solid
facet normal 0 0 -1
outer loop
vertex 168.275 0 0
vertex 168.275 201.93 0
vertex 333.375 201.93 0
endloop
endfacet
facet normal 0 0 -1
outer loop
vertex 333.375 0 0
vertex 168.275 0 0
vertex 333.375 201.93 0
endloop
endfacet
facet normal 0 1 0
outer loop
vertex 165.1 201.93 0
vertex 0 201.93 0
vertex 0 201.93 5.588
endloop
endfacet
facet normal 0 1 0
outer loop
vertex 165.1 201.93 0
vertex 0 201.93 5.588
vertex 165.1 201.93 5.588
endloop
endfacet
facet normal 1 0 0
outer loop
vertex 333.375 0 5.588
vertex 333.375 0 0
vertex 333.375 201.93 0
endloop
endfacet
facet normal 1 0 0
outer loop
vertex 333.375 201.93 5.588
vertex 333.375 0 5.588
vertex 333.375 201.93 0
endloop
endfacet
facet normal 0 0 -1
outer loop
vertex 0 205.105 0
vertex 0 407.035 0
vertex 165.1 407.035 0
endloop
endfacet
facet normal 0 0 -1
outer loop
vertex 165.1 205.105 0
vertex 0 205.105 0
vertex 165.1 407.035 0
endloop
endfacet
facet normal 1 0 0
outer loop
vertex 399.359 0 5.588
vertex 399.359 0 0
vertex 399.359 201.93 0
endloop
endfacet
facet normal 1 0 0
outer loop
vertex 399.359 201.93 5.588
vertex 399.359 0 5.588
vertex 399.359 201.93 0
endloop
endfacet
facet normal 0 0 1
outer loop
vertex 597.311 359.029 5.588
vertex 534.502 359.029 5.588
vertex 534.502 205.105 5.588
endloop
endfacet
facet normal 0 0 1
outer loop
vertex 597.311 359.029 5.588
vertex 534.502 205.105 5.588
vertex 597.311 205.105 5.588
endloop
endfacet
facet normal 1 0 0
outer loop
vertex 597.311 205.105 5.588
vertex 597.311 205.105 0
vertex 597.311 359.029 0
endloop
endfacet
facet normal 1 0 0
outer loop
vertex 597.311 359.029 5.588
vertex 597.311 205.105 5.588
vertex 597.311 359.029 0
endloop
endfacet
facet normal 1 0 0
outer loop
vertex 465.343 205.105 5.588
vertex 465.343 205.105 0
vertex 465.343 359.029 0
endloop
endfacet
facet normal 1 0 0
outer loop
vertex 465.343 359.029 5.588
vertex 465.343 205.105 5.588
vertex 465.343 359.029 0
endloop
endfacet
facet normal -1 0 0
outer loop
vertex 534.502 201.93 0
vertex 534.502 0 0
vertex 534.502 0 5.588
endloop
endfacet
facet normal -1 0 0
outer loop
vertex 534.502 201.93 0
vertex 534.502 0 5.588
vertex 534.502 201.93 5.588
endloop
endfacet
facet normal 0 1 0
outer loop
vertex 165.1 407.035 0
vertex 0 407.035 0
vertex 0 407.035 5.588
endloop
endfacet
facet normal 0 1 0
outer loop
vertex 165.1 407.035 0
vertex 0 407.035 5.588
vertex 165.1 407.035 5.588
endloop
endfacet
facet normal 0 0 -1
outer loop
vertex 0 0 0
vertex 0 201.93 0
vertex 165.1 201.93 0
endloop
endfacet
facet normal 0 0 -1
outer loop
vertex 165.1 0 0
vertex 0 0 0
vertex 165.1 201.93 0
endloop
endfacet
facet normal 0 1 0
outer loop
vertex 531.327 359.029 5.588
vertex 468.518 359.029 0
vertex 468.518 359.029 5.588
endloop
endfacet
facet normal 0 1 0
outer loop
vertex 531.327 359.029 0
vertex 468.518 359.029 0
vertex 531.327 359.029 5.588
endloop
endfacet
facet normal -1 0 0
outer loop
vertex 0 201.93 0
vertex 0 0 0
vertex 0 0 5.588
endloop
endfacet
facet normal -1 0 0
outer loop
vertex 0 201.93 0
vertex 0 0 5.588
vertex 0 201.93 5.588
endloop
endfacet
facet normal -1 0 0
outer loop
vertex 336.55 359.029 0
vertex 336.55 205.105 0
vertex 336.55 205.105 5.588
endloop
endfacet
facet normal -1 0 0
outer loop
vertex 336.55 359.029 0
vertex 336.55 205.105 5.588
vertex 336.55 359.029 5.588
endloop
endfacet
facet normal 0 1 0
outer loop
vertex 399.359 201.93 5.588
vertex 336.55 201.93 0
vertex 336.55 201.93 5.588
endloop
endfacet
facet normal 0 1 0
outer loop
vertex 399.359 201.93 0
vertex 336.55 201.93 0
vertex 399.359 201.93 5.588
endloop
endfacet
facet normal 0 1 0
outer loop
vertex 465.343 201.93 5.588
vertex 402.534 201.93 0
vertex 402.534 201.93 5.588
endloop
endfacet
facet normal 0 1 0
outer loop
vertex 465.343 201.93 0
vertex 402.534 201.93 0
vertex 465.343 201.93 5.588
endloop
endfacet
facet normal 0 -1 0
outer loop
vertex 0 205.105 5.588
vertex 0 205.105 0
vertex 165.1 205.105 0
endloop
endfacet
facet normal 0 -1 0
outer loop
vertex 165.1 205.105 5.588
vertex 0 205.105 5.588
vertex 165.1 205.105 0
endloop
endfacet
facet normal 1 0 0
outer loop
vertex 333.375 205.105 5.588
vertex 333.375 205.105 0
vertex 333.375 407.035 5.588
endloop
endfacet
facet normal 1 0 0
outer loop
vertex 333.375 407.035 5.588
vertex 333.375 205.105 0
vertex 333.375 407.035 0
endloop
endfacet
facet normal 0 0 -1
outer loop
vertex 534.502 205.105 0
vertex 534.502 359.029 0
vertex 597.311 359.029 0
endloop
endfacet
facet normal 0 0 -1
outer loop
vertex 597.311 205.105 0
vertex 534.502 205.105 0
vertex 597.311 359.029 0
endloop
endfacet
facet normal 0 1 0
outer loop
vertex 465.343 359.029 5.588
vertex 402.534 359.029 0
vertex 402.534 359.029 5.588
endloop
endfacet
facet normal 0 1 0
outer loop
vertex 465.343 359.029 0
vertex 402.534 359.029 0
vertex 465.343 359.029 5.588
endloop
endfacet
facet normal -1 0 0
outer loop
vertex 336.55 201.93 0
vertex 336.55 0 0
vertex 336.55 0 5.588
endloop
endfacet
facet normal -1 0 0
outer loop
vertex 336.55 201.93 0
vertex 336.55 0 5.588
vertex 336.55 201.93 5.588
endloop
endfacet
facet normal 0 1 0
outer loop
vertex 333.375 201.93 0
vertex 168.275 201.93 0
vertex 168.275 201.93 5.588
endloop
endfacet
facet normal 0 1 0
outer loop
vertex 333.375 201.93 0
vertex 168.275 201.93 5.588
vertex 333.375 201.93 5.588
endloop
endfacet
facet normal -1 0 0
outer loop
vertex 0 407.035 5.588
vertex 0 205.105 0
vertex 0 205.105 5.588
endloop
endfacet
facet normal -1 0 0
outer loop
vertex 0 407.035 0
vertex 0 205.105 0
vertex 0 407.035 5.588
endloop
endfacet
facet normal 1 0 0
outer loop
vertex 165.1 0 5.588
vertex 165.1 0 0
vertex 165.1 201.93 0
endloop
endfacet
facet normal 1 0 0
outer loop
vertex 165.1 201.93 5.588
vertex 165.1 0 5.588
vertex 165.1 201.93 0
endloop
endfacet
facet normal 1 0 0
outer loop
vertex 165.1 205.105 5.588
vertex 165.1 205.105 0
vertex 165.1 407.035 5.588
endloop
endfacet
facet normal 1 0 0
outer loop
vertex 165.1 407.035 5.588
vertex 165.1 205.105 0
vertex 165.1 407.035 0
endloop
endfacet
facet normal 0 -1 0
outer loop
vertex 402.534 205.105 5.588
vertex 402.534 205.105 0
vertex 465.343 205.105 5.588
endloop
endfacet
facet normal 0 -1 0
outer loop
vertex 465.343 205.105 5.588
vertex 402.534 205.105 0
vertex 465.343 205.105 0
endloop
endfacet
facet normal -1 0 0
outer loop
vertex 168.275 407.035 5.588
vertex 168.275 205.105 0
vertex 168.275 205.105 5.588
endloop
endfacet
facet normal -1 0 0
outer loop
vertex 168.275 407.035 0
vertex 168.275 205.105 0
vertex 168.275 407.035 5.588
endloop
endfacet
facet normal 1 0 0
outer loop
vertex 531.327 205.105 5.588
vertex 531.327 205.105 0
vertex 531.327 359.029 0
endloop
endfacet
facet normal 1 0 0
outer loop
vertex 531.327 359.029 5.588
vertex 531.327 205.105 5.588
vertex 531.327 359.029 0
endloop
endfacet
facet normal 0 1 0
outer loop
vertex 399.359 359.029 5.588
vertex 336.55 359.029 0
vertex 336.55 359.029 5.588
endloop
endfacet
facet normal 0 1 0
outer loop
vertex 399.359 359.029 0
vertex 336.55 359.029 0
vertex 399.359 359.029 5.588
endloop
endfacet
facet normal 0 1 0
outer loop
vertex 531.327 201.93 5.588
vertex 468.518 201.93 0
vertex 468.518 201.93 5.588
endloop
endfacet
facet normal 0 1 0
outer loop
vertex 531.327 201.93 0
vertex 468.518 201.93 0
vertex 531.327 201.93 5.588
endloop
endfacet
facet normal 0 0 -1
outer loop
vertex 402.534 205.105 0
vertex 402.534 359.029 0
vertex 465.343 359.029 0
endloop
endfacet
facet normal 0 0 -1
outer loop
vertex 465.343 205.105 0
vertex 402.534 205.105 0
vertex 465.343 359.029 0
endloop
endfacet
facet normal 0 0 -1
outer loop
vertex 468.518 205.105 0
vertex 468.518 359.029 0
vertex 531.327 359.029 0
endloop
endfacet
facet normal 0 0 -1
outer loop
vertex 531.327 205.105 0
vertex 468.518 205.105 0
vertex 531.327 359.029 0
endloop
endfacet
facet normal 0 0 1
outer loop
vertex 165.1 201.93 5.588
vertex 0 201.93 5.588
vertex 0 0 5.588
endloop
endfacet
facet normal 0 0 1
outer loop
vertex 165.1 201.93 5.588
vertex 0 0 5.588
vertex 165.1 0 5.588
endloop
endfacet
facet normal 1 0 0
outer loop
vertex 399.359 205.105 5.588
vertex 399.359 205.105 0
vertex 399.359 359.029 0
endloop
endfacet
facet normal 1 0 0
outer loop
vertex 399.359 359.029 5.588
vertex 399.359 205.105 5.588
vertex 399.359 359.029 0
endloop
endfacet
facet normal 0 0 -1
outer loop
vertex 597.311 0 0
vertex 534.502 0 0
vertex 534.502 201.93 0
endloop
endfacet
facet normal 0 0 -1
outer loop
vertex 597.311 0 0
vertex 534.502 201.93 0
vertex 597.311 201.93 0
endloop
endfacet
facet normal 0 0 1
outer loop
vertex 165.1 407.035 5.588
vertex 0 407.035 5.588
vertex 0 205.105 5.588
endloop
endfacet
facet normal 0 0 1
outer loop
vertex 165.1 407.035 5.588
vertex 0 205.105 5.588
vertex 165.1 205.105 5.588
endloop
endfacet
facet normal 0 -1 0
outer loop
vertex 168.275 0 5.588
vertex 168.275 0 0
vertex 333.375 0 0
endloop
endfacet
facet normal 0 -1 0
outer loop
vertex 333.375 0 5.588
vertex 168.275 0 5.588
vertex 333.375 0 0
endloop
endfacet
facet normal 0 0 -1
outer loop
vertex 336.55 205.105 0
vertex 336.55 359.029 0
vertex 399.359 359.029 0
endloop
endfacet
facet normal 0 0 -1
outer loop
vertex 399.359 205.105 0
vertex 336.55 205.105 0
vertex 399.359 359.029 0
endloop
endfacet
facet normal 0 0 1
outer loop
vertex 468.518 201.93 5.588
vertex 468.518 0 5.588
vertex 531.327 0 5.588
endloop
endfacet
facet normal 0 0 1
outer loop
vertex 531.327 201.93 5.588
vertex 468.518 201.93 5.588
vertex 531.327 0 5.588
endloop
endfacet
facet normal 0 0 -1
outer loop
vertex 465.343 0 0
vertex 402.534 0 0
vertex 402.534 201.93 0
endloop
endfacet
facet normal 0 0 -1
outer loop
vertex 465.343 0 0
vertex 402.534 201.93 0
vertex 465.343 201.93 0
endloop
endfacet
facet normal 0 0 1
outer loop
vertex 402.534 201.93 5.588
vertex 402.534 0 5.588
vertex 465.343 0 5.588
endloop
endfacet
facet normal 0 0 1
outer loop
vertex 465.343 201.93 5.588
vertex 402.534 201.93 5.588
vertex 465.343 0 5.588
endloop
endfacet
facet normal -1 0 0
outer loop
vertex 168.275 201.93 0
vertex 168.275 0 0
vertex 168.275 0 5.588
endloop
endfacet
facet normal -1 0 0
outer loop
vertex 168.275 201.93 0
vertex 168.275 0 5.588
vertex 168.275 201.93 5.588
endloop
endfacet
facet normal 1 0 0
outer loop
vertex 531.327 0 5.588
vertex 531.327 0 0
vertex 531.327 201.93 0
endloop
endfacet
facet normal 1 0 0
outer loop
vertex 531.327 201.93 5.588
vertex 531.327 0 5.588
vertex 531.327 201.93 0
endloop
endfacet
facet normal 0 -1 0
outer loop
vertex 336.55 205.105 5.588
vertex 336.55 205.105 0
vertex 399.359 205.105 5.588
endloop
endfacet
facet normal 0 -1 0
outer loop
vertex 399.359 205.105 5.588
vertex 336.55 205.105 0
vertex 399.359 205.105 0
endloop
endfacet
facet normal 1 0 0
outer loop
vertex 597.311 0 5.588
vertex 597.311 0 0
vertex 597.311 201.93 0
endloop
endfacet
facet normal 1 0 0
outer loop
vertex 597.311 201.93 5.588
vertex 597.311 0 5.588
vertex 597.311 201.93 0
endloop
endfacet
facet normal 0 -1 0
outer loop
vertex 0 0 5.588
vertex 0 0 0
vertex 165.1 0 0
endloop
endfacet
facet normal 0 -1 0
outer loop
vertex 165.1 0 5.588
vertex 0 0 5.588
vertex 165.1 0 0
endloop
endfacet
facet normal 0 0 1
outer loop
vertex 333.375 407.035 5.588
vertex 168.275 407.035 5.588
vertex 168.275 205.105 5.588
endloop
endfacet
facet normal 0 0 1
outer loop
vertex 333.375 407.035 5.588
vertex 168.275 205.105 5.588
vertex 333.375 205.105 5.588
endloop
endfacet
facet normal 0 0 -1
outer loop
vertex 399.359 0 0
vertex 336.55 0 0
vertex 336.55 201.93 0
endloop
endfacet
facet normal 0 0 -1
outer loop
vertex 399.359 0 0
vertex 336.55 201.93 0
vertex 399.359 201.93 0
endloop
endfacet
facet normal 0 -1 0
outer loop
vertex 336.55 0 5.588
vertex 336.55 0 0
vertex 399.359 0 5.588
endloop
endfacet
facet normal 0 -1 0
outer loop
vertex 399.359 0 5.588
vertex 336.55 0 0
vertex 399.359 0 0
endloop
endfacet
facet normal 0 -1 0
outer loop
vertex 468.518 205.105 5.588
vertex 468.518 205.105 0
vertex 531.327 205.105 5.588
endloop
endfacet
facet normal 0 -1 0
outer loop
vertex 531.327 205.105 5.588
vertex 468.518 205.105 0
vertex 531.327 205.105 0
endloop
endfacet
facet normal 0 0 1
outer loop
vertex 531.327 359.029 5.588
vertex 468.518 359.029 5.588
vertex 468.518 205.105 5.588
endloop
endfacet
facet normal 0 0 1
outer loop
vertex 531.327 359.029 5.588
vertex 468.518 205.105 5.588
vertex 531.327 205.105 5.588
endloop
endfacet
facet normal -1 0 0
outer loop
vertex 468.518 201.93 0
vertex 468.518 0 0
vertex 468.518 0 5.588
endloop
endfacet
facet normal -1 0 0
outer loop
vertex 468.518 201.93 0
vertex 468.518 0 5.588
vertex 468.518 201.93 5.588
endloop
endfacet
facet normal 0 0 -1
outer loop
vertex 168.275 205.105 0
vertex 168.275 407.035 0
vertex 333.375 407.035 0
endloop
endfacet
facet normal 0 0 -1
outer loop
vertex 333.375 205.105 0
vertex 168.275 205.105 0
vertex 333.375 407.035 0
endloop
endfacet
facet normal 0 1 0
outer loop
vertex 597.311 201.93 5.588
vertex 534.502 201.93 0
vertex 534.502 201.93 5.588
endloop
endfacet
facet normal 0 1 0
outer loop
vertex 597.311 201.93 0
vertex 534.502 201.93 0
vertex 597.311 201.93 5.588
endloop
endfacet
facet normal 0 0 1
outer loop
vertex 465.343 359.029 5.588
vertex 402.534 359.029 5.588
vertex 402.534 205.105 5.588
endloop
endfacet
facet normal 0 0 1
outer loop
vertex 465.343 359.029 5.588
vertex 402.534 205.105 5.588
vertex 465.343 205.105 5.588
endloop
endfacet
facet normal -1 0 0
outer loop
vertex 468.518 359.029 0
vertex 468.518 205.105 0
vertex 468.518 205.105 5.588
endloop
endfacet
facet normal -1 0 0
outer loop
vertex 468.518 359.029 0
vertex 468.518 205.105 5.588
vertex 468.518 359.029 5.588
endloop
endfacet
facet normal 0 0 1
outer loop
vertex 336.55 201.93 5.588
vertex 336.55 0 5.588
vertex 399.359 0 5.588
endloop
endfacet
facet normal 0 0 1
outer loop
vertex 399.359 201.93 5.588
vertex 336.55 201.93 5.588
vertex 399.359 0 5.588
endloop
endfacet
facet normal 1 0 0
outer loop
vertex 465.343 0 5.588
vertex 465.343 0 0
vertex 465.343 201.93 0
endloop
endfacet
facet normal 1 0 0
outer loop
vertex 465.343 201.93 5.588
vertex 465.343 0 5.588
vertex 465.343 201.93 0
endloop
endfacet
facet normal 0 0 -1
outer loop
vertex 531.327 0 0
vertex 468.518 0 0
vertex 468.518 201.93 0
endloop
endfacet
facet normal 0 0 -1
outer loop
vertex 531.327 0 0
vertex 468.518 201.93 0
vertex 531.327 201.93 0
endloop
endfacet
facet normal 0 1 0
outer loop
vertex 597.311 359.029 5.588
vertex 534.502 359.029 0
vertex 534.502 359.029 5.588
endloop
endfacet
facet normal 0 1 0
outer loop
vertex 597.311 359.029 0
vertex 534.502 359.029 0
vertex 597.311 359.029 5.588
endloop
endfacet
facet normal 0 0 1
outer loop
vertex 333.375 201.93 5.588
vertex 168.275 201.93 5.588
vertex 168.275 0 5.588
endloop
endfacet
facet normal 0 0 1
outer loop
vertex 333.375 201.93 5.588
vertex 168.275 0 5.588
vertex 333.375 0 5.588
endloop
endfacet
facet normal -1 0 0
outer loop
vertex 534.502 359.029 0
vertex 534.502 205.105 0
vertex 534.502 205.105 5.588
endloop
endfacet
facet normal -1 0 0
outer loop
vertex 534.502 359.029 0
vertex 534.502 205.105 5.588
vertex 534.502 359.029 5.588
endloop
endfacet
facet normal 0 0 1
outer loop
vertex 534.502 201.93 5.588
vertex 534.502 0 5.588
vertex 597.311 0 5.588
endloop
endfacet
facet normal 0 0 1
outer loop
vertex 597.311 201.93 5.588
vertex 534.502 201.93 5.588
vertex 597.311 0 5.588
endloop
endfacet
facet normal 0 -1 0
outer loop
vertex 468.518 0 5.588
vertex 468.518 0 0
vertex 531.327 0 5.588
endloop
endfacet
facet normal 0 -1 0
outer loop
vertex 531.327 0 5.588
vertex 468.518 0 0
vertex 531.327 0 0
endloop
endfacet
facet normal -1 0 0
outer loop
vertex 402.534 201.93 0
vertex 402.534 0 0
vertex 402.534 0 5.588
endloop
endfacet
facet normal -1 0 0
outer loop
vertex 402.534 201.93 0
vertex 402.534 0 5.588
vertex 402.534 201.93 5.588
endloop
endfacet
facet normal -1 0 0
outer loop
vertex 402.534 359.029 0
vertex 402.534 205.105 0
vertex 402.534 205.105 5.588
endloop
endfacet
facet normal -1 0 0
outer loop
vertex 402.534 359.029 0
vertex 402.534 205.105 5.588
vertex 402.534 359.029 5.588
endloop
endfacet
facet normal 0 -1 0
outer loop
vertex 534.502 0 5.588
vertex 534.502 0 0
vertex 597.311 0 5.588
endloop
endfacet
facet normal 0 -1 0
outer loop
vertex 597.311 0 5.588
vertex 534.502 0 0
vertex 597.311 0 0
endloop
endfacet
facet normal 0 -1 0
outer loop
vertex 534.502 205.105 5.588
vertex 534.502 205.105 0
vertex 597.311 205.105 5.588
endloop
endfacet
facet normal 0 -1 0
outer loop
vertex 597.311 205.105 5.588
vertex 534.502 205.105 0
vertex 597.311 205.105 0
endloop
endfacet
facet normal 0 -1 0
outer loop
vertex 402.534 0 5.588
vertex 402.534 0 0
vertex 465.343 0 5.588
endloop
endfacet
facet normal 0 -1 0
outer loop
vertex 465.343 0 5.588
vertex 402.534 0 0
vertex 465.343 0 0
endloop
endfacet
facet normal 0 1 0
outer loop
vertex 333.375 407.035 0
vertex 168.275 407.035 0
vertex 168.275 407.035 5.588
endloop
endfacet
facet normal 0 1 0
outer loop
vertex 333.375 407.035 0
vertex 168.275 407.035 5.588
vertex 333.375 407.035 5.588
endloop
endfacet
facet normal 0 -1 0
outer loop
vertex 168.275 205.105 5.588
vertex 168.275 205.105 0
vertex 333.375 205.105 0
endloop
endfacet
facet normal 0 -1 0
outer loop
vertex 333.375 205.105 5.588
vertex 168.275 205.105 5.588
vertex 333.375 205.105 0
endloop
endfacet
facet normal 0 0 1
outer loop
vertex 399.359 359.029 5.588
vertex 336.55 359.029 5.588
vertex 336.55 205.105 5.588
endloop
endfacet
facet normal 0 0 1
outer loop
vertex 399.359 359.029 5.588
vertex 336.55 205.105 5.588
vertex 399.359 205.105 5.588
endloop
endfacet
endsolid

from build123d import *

# Parameters (mm, degrees)
F0_W     = 165.1
F0_H     = 201.93
F0_W_2   = 62.80912
F0_H_2   = 153.924
F1_DEPTH = 5.588


with BuildPart() as f1:
    # F0 (on Top) → F1 (new body)
    with BuildSketch(Plane.XY):
        with Locations((250.825, 100.965)):
            Rectangle(F0_W, F0_H)
        with Locations((565.90692, 100.965)):
            Rectangle(F0_W_2, F0_H)
        with Locations((433.93868, 282.067)):
            Rectangle(F0_W_2, F0_H_2)
        with Locations((433.93868, 100.965)):
            Rectangle(F0_W_2, F0_H)
        with Locations((82.55, 306.07)):
            Rectangle(F0_W, F0_H)
        with Locations((367.95456, 100.965)):
            Rectangle(F0_W_2, F0_H)
        with Locations((250.825, 306.07)):
            Rectangle(F0_W, F0_H)
        with Locations((82.55, 100.965)):
            Rectangle(F0_W, F0_H)
        with Locations((499.9228, 282.067)):
            Rectangle(F0_W_2, F0_H_2)
        with Locations((367.95456, 282.067)):
            Rectangle(F0_W_2, F0_H_2)
        with Locations((499.9228, 100.965)):
            Rectangle(F0_W_2, F0_H)
        with Locations((565.90692, 282.067)):
            Rectangle(F0_W_2, F0_H_2)
    extrude(amount=F1_DEPTH)


solid = f1.part
